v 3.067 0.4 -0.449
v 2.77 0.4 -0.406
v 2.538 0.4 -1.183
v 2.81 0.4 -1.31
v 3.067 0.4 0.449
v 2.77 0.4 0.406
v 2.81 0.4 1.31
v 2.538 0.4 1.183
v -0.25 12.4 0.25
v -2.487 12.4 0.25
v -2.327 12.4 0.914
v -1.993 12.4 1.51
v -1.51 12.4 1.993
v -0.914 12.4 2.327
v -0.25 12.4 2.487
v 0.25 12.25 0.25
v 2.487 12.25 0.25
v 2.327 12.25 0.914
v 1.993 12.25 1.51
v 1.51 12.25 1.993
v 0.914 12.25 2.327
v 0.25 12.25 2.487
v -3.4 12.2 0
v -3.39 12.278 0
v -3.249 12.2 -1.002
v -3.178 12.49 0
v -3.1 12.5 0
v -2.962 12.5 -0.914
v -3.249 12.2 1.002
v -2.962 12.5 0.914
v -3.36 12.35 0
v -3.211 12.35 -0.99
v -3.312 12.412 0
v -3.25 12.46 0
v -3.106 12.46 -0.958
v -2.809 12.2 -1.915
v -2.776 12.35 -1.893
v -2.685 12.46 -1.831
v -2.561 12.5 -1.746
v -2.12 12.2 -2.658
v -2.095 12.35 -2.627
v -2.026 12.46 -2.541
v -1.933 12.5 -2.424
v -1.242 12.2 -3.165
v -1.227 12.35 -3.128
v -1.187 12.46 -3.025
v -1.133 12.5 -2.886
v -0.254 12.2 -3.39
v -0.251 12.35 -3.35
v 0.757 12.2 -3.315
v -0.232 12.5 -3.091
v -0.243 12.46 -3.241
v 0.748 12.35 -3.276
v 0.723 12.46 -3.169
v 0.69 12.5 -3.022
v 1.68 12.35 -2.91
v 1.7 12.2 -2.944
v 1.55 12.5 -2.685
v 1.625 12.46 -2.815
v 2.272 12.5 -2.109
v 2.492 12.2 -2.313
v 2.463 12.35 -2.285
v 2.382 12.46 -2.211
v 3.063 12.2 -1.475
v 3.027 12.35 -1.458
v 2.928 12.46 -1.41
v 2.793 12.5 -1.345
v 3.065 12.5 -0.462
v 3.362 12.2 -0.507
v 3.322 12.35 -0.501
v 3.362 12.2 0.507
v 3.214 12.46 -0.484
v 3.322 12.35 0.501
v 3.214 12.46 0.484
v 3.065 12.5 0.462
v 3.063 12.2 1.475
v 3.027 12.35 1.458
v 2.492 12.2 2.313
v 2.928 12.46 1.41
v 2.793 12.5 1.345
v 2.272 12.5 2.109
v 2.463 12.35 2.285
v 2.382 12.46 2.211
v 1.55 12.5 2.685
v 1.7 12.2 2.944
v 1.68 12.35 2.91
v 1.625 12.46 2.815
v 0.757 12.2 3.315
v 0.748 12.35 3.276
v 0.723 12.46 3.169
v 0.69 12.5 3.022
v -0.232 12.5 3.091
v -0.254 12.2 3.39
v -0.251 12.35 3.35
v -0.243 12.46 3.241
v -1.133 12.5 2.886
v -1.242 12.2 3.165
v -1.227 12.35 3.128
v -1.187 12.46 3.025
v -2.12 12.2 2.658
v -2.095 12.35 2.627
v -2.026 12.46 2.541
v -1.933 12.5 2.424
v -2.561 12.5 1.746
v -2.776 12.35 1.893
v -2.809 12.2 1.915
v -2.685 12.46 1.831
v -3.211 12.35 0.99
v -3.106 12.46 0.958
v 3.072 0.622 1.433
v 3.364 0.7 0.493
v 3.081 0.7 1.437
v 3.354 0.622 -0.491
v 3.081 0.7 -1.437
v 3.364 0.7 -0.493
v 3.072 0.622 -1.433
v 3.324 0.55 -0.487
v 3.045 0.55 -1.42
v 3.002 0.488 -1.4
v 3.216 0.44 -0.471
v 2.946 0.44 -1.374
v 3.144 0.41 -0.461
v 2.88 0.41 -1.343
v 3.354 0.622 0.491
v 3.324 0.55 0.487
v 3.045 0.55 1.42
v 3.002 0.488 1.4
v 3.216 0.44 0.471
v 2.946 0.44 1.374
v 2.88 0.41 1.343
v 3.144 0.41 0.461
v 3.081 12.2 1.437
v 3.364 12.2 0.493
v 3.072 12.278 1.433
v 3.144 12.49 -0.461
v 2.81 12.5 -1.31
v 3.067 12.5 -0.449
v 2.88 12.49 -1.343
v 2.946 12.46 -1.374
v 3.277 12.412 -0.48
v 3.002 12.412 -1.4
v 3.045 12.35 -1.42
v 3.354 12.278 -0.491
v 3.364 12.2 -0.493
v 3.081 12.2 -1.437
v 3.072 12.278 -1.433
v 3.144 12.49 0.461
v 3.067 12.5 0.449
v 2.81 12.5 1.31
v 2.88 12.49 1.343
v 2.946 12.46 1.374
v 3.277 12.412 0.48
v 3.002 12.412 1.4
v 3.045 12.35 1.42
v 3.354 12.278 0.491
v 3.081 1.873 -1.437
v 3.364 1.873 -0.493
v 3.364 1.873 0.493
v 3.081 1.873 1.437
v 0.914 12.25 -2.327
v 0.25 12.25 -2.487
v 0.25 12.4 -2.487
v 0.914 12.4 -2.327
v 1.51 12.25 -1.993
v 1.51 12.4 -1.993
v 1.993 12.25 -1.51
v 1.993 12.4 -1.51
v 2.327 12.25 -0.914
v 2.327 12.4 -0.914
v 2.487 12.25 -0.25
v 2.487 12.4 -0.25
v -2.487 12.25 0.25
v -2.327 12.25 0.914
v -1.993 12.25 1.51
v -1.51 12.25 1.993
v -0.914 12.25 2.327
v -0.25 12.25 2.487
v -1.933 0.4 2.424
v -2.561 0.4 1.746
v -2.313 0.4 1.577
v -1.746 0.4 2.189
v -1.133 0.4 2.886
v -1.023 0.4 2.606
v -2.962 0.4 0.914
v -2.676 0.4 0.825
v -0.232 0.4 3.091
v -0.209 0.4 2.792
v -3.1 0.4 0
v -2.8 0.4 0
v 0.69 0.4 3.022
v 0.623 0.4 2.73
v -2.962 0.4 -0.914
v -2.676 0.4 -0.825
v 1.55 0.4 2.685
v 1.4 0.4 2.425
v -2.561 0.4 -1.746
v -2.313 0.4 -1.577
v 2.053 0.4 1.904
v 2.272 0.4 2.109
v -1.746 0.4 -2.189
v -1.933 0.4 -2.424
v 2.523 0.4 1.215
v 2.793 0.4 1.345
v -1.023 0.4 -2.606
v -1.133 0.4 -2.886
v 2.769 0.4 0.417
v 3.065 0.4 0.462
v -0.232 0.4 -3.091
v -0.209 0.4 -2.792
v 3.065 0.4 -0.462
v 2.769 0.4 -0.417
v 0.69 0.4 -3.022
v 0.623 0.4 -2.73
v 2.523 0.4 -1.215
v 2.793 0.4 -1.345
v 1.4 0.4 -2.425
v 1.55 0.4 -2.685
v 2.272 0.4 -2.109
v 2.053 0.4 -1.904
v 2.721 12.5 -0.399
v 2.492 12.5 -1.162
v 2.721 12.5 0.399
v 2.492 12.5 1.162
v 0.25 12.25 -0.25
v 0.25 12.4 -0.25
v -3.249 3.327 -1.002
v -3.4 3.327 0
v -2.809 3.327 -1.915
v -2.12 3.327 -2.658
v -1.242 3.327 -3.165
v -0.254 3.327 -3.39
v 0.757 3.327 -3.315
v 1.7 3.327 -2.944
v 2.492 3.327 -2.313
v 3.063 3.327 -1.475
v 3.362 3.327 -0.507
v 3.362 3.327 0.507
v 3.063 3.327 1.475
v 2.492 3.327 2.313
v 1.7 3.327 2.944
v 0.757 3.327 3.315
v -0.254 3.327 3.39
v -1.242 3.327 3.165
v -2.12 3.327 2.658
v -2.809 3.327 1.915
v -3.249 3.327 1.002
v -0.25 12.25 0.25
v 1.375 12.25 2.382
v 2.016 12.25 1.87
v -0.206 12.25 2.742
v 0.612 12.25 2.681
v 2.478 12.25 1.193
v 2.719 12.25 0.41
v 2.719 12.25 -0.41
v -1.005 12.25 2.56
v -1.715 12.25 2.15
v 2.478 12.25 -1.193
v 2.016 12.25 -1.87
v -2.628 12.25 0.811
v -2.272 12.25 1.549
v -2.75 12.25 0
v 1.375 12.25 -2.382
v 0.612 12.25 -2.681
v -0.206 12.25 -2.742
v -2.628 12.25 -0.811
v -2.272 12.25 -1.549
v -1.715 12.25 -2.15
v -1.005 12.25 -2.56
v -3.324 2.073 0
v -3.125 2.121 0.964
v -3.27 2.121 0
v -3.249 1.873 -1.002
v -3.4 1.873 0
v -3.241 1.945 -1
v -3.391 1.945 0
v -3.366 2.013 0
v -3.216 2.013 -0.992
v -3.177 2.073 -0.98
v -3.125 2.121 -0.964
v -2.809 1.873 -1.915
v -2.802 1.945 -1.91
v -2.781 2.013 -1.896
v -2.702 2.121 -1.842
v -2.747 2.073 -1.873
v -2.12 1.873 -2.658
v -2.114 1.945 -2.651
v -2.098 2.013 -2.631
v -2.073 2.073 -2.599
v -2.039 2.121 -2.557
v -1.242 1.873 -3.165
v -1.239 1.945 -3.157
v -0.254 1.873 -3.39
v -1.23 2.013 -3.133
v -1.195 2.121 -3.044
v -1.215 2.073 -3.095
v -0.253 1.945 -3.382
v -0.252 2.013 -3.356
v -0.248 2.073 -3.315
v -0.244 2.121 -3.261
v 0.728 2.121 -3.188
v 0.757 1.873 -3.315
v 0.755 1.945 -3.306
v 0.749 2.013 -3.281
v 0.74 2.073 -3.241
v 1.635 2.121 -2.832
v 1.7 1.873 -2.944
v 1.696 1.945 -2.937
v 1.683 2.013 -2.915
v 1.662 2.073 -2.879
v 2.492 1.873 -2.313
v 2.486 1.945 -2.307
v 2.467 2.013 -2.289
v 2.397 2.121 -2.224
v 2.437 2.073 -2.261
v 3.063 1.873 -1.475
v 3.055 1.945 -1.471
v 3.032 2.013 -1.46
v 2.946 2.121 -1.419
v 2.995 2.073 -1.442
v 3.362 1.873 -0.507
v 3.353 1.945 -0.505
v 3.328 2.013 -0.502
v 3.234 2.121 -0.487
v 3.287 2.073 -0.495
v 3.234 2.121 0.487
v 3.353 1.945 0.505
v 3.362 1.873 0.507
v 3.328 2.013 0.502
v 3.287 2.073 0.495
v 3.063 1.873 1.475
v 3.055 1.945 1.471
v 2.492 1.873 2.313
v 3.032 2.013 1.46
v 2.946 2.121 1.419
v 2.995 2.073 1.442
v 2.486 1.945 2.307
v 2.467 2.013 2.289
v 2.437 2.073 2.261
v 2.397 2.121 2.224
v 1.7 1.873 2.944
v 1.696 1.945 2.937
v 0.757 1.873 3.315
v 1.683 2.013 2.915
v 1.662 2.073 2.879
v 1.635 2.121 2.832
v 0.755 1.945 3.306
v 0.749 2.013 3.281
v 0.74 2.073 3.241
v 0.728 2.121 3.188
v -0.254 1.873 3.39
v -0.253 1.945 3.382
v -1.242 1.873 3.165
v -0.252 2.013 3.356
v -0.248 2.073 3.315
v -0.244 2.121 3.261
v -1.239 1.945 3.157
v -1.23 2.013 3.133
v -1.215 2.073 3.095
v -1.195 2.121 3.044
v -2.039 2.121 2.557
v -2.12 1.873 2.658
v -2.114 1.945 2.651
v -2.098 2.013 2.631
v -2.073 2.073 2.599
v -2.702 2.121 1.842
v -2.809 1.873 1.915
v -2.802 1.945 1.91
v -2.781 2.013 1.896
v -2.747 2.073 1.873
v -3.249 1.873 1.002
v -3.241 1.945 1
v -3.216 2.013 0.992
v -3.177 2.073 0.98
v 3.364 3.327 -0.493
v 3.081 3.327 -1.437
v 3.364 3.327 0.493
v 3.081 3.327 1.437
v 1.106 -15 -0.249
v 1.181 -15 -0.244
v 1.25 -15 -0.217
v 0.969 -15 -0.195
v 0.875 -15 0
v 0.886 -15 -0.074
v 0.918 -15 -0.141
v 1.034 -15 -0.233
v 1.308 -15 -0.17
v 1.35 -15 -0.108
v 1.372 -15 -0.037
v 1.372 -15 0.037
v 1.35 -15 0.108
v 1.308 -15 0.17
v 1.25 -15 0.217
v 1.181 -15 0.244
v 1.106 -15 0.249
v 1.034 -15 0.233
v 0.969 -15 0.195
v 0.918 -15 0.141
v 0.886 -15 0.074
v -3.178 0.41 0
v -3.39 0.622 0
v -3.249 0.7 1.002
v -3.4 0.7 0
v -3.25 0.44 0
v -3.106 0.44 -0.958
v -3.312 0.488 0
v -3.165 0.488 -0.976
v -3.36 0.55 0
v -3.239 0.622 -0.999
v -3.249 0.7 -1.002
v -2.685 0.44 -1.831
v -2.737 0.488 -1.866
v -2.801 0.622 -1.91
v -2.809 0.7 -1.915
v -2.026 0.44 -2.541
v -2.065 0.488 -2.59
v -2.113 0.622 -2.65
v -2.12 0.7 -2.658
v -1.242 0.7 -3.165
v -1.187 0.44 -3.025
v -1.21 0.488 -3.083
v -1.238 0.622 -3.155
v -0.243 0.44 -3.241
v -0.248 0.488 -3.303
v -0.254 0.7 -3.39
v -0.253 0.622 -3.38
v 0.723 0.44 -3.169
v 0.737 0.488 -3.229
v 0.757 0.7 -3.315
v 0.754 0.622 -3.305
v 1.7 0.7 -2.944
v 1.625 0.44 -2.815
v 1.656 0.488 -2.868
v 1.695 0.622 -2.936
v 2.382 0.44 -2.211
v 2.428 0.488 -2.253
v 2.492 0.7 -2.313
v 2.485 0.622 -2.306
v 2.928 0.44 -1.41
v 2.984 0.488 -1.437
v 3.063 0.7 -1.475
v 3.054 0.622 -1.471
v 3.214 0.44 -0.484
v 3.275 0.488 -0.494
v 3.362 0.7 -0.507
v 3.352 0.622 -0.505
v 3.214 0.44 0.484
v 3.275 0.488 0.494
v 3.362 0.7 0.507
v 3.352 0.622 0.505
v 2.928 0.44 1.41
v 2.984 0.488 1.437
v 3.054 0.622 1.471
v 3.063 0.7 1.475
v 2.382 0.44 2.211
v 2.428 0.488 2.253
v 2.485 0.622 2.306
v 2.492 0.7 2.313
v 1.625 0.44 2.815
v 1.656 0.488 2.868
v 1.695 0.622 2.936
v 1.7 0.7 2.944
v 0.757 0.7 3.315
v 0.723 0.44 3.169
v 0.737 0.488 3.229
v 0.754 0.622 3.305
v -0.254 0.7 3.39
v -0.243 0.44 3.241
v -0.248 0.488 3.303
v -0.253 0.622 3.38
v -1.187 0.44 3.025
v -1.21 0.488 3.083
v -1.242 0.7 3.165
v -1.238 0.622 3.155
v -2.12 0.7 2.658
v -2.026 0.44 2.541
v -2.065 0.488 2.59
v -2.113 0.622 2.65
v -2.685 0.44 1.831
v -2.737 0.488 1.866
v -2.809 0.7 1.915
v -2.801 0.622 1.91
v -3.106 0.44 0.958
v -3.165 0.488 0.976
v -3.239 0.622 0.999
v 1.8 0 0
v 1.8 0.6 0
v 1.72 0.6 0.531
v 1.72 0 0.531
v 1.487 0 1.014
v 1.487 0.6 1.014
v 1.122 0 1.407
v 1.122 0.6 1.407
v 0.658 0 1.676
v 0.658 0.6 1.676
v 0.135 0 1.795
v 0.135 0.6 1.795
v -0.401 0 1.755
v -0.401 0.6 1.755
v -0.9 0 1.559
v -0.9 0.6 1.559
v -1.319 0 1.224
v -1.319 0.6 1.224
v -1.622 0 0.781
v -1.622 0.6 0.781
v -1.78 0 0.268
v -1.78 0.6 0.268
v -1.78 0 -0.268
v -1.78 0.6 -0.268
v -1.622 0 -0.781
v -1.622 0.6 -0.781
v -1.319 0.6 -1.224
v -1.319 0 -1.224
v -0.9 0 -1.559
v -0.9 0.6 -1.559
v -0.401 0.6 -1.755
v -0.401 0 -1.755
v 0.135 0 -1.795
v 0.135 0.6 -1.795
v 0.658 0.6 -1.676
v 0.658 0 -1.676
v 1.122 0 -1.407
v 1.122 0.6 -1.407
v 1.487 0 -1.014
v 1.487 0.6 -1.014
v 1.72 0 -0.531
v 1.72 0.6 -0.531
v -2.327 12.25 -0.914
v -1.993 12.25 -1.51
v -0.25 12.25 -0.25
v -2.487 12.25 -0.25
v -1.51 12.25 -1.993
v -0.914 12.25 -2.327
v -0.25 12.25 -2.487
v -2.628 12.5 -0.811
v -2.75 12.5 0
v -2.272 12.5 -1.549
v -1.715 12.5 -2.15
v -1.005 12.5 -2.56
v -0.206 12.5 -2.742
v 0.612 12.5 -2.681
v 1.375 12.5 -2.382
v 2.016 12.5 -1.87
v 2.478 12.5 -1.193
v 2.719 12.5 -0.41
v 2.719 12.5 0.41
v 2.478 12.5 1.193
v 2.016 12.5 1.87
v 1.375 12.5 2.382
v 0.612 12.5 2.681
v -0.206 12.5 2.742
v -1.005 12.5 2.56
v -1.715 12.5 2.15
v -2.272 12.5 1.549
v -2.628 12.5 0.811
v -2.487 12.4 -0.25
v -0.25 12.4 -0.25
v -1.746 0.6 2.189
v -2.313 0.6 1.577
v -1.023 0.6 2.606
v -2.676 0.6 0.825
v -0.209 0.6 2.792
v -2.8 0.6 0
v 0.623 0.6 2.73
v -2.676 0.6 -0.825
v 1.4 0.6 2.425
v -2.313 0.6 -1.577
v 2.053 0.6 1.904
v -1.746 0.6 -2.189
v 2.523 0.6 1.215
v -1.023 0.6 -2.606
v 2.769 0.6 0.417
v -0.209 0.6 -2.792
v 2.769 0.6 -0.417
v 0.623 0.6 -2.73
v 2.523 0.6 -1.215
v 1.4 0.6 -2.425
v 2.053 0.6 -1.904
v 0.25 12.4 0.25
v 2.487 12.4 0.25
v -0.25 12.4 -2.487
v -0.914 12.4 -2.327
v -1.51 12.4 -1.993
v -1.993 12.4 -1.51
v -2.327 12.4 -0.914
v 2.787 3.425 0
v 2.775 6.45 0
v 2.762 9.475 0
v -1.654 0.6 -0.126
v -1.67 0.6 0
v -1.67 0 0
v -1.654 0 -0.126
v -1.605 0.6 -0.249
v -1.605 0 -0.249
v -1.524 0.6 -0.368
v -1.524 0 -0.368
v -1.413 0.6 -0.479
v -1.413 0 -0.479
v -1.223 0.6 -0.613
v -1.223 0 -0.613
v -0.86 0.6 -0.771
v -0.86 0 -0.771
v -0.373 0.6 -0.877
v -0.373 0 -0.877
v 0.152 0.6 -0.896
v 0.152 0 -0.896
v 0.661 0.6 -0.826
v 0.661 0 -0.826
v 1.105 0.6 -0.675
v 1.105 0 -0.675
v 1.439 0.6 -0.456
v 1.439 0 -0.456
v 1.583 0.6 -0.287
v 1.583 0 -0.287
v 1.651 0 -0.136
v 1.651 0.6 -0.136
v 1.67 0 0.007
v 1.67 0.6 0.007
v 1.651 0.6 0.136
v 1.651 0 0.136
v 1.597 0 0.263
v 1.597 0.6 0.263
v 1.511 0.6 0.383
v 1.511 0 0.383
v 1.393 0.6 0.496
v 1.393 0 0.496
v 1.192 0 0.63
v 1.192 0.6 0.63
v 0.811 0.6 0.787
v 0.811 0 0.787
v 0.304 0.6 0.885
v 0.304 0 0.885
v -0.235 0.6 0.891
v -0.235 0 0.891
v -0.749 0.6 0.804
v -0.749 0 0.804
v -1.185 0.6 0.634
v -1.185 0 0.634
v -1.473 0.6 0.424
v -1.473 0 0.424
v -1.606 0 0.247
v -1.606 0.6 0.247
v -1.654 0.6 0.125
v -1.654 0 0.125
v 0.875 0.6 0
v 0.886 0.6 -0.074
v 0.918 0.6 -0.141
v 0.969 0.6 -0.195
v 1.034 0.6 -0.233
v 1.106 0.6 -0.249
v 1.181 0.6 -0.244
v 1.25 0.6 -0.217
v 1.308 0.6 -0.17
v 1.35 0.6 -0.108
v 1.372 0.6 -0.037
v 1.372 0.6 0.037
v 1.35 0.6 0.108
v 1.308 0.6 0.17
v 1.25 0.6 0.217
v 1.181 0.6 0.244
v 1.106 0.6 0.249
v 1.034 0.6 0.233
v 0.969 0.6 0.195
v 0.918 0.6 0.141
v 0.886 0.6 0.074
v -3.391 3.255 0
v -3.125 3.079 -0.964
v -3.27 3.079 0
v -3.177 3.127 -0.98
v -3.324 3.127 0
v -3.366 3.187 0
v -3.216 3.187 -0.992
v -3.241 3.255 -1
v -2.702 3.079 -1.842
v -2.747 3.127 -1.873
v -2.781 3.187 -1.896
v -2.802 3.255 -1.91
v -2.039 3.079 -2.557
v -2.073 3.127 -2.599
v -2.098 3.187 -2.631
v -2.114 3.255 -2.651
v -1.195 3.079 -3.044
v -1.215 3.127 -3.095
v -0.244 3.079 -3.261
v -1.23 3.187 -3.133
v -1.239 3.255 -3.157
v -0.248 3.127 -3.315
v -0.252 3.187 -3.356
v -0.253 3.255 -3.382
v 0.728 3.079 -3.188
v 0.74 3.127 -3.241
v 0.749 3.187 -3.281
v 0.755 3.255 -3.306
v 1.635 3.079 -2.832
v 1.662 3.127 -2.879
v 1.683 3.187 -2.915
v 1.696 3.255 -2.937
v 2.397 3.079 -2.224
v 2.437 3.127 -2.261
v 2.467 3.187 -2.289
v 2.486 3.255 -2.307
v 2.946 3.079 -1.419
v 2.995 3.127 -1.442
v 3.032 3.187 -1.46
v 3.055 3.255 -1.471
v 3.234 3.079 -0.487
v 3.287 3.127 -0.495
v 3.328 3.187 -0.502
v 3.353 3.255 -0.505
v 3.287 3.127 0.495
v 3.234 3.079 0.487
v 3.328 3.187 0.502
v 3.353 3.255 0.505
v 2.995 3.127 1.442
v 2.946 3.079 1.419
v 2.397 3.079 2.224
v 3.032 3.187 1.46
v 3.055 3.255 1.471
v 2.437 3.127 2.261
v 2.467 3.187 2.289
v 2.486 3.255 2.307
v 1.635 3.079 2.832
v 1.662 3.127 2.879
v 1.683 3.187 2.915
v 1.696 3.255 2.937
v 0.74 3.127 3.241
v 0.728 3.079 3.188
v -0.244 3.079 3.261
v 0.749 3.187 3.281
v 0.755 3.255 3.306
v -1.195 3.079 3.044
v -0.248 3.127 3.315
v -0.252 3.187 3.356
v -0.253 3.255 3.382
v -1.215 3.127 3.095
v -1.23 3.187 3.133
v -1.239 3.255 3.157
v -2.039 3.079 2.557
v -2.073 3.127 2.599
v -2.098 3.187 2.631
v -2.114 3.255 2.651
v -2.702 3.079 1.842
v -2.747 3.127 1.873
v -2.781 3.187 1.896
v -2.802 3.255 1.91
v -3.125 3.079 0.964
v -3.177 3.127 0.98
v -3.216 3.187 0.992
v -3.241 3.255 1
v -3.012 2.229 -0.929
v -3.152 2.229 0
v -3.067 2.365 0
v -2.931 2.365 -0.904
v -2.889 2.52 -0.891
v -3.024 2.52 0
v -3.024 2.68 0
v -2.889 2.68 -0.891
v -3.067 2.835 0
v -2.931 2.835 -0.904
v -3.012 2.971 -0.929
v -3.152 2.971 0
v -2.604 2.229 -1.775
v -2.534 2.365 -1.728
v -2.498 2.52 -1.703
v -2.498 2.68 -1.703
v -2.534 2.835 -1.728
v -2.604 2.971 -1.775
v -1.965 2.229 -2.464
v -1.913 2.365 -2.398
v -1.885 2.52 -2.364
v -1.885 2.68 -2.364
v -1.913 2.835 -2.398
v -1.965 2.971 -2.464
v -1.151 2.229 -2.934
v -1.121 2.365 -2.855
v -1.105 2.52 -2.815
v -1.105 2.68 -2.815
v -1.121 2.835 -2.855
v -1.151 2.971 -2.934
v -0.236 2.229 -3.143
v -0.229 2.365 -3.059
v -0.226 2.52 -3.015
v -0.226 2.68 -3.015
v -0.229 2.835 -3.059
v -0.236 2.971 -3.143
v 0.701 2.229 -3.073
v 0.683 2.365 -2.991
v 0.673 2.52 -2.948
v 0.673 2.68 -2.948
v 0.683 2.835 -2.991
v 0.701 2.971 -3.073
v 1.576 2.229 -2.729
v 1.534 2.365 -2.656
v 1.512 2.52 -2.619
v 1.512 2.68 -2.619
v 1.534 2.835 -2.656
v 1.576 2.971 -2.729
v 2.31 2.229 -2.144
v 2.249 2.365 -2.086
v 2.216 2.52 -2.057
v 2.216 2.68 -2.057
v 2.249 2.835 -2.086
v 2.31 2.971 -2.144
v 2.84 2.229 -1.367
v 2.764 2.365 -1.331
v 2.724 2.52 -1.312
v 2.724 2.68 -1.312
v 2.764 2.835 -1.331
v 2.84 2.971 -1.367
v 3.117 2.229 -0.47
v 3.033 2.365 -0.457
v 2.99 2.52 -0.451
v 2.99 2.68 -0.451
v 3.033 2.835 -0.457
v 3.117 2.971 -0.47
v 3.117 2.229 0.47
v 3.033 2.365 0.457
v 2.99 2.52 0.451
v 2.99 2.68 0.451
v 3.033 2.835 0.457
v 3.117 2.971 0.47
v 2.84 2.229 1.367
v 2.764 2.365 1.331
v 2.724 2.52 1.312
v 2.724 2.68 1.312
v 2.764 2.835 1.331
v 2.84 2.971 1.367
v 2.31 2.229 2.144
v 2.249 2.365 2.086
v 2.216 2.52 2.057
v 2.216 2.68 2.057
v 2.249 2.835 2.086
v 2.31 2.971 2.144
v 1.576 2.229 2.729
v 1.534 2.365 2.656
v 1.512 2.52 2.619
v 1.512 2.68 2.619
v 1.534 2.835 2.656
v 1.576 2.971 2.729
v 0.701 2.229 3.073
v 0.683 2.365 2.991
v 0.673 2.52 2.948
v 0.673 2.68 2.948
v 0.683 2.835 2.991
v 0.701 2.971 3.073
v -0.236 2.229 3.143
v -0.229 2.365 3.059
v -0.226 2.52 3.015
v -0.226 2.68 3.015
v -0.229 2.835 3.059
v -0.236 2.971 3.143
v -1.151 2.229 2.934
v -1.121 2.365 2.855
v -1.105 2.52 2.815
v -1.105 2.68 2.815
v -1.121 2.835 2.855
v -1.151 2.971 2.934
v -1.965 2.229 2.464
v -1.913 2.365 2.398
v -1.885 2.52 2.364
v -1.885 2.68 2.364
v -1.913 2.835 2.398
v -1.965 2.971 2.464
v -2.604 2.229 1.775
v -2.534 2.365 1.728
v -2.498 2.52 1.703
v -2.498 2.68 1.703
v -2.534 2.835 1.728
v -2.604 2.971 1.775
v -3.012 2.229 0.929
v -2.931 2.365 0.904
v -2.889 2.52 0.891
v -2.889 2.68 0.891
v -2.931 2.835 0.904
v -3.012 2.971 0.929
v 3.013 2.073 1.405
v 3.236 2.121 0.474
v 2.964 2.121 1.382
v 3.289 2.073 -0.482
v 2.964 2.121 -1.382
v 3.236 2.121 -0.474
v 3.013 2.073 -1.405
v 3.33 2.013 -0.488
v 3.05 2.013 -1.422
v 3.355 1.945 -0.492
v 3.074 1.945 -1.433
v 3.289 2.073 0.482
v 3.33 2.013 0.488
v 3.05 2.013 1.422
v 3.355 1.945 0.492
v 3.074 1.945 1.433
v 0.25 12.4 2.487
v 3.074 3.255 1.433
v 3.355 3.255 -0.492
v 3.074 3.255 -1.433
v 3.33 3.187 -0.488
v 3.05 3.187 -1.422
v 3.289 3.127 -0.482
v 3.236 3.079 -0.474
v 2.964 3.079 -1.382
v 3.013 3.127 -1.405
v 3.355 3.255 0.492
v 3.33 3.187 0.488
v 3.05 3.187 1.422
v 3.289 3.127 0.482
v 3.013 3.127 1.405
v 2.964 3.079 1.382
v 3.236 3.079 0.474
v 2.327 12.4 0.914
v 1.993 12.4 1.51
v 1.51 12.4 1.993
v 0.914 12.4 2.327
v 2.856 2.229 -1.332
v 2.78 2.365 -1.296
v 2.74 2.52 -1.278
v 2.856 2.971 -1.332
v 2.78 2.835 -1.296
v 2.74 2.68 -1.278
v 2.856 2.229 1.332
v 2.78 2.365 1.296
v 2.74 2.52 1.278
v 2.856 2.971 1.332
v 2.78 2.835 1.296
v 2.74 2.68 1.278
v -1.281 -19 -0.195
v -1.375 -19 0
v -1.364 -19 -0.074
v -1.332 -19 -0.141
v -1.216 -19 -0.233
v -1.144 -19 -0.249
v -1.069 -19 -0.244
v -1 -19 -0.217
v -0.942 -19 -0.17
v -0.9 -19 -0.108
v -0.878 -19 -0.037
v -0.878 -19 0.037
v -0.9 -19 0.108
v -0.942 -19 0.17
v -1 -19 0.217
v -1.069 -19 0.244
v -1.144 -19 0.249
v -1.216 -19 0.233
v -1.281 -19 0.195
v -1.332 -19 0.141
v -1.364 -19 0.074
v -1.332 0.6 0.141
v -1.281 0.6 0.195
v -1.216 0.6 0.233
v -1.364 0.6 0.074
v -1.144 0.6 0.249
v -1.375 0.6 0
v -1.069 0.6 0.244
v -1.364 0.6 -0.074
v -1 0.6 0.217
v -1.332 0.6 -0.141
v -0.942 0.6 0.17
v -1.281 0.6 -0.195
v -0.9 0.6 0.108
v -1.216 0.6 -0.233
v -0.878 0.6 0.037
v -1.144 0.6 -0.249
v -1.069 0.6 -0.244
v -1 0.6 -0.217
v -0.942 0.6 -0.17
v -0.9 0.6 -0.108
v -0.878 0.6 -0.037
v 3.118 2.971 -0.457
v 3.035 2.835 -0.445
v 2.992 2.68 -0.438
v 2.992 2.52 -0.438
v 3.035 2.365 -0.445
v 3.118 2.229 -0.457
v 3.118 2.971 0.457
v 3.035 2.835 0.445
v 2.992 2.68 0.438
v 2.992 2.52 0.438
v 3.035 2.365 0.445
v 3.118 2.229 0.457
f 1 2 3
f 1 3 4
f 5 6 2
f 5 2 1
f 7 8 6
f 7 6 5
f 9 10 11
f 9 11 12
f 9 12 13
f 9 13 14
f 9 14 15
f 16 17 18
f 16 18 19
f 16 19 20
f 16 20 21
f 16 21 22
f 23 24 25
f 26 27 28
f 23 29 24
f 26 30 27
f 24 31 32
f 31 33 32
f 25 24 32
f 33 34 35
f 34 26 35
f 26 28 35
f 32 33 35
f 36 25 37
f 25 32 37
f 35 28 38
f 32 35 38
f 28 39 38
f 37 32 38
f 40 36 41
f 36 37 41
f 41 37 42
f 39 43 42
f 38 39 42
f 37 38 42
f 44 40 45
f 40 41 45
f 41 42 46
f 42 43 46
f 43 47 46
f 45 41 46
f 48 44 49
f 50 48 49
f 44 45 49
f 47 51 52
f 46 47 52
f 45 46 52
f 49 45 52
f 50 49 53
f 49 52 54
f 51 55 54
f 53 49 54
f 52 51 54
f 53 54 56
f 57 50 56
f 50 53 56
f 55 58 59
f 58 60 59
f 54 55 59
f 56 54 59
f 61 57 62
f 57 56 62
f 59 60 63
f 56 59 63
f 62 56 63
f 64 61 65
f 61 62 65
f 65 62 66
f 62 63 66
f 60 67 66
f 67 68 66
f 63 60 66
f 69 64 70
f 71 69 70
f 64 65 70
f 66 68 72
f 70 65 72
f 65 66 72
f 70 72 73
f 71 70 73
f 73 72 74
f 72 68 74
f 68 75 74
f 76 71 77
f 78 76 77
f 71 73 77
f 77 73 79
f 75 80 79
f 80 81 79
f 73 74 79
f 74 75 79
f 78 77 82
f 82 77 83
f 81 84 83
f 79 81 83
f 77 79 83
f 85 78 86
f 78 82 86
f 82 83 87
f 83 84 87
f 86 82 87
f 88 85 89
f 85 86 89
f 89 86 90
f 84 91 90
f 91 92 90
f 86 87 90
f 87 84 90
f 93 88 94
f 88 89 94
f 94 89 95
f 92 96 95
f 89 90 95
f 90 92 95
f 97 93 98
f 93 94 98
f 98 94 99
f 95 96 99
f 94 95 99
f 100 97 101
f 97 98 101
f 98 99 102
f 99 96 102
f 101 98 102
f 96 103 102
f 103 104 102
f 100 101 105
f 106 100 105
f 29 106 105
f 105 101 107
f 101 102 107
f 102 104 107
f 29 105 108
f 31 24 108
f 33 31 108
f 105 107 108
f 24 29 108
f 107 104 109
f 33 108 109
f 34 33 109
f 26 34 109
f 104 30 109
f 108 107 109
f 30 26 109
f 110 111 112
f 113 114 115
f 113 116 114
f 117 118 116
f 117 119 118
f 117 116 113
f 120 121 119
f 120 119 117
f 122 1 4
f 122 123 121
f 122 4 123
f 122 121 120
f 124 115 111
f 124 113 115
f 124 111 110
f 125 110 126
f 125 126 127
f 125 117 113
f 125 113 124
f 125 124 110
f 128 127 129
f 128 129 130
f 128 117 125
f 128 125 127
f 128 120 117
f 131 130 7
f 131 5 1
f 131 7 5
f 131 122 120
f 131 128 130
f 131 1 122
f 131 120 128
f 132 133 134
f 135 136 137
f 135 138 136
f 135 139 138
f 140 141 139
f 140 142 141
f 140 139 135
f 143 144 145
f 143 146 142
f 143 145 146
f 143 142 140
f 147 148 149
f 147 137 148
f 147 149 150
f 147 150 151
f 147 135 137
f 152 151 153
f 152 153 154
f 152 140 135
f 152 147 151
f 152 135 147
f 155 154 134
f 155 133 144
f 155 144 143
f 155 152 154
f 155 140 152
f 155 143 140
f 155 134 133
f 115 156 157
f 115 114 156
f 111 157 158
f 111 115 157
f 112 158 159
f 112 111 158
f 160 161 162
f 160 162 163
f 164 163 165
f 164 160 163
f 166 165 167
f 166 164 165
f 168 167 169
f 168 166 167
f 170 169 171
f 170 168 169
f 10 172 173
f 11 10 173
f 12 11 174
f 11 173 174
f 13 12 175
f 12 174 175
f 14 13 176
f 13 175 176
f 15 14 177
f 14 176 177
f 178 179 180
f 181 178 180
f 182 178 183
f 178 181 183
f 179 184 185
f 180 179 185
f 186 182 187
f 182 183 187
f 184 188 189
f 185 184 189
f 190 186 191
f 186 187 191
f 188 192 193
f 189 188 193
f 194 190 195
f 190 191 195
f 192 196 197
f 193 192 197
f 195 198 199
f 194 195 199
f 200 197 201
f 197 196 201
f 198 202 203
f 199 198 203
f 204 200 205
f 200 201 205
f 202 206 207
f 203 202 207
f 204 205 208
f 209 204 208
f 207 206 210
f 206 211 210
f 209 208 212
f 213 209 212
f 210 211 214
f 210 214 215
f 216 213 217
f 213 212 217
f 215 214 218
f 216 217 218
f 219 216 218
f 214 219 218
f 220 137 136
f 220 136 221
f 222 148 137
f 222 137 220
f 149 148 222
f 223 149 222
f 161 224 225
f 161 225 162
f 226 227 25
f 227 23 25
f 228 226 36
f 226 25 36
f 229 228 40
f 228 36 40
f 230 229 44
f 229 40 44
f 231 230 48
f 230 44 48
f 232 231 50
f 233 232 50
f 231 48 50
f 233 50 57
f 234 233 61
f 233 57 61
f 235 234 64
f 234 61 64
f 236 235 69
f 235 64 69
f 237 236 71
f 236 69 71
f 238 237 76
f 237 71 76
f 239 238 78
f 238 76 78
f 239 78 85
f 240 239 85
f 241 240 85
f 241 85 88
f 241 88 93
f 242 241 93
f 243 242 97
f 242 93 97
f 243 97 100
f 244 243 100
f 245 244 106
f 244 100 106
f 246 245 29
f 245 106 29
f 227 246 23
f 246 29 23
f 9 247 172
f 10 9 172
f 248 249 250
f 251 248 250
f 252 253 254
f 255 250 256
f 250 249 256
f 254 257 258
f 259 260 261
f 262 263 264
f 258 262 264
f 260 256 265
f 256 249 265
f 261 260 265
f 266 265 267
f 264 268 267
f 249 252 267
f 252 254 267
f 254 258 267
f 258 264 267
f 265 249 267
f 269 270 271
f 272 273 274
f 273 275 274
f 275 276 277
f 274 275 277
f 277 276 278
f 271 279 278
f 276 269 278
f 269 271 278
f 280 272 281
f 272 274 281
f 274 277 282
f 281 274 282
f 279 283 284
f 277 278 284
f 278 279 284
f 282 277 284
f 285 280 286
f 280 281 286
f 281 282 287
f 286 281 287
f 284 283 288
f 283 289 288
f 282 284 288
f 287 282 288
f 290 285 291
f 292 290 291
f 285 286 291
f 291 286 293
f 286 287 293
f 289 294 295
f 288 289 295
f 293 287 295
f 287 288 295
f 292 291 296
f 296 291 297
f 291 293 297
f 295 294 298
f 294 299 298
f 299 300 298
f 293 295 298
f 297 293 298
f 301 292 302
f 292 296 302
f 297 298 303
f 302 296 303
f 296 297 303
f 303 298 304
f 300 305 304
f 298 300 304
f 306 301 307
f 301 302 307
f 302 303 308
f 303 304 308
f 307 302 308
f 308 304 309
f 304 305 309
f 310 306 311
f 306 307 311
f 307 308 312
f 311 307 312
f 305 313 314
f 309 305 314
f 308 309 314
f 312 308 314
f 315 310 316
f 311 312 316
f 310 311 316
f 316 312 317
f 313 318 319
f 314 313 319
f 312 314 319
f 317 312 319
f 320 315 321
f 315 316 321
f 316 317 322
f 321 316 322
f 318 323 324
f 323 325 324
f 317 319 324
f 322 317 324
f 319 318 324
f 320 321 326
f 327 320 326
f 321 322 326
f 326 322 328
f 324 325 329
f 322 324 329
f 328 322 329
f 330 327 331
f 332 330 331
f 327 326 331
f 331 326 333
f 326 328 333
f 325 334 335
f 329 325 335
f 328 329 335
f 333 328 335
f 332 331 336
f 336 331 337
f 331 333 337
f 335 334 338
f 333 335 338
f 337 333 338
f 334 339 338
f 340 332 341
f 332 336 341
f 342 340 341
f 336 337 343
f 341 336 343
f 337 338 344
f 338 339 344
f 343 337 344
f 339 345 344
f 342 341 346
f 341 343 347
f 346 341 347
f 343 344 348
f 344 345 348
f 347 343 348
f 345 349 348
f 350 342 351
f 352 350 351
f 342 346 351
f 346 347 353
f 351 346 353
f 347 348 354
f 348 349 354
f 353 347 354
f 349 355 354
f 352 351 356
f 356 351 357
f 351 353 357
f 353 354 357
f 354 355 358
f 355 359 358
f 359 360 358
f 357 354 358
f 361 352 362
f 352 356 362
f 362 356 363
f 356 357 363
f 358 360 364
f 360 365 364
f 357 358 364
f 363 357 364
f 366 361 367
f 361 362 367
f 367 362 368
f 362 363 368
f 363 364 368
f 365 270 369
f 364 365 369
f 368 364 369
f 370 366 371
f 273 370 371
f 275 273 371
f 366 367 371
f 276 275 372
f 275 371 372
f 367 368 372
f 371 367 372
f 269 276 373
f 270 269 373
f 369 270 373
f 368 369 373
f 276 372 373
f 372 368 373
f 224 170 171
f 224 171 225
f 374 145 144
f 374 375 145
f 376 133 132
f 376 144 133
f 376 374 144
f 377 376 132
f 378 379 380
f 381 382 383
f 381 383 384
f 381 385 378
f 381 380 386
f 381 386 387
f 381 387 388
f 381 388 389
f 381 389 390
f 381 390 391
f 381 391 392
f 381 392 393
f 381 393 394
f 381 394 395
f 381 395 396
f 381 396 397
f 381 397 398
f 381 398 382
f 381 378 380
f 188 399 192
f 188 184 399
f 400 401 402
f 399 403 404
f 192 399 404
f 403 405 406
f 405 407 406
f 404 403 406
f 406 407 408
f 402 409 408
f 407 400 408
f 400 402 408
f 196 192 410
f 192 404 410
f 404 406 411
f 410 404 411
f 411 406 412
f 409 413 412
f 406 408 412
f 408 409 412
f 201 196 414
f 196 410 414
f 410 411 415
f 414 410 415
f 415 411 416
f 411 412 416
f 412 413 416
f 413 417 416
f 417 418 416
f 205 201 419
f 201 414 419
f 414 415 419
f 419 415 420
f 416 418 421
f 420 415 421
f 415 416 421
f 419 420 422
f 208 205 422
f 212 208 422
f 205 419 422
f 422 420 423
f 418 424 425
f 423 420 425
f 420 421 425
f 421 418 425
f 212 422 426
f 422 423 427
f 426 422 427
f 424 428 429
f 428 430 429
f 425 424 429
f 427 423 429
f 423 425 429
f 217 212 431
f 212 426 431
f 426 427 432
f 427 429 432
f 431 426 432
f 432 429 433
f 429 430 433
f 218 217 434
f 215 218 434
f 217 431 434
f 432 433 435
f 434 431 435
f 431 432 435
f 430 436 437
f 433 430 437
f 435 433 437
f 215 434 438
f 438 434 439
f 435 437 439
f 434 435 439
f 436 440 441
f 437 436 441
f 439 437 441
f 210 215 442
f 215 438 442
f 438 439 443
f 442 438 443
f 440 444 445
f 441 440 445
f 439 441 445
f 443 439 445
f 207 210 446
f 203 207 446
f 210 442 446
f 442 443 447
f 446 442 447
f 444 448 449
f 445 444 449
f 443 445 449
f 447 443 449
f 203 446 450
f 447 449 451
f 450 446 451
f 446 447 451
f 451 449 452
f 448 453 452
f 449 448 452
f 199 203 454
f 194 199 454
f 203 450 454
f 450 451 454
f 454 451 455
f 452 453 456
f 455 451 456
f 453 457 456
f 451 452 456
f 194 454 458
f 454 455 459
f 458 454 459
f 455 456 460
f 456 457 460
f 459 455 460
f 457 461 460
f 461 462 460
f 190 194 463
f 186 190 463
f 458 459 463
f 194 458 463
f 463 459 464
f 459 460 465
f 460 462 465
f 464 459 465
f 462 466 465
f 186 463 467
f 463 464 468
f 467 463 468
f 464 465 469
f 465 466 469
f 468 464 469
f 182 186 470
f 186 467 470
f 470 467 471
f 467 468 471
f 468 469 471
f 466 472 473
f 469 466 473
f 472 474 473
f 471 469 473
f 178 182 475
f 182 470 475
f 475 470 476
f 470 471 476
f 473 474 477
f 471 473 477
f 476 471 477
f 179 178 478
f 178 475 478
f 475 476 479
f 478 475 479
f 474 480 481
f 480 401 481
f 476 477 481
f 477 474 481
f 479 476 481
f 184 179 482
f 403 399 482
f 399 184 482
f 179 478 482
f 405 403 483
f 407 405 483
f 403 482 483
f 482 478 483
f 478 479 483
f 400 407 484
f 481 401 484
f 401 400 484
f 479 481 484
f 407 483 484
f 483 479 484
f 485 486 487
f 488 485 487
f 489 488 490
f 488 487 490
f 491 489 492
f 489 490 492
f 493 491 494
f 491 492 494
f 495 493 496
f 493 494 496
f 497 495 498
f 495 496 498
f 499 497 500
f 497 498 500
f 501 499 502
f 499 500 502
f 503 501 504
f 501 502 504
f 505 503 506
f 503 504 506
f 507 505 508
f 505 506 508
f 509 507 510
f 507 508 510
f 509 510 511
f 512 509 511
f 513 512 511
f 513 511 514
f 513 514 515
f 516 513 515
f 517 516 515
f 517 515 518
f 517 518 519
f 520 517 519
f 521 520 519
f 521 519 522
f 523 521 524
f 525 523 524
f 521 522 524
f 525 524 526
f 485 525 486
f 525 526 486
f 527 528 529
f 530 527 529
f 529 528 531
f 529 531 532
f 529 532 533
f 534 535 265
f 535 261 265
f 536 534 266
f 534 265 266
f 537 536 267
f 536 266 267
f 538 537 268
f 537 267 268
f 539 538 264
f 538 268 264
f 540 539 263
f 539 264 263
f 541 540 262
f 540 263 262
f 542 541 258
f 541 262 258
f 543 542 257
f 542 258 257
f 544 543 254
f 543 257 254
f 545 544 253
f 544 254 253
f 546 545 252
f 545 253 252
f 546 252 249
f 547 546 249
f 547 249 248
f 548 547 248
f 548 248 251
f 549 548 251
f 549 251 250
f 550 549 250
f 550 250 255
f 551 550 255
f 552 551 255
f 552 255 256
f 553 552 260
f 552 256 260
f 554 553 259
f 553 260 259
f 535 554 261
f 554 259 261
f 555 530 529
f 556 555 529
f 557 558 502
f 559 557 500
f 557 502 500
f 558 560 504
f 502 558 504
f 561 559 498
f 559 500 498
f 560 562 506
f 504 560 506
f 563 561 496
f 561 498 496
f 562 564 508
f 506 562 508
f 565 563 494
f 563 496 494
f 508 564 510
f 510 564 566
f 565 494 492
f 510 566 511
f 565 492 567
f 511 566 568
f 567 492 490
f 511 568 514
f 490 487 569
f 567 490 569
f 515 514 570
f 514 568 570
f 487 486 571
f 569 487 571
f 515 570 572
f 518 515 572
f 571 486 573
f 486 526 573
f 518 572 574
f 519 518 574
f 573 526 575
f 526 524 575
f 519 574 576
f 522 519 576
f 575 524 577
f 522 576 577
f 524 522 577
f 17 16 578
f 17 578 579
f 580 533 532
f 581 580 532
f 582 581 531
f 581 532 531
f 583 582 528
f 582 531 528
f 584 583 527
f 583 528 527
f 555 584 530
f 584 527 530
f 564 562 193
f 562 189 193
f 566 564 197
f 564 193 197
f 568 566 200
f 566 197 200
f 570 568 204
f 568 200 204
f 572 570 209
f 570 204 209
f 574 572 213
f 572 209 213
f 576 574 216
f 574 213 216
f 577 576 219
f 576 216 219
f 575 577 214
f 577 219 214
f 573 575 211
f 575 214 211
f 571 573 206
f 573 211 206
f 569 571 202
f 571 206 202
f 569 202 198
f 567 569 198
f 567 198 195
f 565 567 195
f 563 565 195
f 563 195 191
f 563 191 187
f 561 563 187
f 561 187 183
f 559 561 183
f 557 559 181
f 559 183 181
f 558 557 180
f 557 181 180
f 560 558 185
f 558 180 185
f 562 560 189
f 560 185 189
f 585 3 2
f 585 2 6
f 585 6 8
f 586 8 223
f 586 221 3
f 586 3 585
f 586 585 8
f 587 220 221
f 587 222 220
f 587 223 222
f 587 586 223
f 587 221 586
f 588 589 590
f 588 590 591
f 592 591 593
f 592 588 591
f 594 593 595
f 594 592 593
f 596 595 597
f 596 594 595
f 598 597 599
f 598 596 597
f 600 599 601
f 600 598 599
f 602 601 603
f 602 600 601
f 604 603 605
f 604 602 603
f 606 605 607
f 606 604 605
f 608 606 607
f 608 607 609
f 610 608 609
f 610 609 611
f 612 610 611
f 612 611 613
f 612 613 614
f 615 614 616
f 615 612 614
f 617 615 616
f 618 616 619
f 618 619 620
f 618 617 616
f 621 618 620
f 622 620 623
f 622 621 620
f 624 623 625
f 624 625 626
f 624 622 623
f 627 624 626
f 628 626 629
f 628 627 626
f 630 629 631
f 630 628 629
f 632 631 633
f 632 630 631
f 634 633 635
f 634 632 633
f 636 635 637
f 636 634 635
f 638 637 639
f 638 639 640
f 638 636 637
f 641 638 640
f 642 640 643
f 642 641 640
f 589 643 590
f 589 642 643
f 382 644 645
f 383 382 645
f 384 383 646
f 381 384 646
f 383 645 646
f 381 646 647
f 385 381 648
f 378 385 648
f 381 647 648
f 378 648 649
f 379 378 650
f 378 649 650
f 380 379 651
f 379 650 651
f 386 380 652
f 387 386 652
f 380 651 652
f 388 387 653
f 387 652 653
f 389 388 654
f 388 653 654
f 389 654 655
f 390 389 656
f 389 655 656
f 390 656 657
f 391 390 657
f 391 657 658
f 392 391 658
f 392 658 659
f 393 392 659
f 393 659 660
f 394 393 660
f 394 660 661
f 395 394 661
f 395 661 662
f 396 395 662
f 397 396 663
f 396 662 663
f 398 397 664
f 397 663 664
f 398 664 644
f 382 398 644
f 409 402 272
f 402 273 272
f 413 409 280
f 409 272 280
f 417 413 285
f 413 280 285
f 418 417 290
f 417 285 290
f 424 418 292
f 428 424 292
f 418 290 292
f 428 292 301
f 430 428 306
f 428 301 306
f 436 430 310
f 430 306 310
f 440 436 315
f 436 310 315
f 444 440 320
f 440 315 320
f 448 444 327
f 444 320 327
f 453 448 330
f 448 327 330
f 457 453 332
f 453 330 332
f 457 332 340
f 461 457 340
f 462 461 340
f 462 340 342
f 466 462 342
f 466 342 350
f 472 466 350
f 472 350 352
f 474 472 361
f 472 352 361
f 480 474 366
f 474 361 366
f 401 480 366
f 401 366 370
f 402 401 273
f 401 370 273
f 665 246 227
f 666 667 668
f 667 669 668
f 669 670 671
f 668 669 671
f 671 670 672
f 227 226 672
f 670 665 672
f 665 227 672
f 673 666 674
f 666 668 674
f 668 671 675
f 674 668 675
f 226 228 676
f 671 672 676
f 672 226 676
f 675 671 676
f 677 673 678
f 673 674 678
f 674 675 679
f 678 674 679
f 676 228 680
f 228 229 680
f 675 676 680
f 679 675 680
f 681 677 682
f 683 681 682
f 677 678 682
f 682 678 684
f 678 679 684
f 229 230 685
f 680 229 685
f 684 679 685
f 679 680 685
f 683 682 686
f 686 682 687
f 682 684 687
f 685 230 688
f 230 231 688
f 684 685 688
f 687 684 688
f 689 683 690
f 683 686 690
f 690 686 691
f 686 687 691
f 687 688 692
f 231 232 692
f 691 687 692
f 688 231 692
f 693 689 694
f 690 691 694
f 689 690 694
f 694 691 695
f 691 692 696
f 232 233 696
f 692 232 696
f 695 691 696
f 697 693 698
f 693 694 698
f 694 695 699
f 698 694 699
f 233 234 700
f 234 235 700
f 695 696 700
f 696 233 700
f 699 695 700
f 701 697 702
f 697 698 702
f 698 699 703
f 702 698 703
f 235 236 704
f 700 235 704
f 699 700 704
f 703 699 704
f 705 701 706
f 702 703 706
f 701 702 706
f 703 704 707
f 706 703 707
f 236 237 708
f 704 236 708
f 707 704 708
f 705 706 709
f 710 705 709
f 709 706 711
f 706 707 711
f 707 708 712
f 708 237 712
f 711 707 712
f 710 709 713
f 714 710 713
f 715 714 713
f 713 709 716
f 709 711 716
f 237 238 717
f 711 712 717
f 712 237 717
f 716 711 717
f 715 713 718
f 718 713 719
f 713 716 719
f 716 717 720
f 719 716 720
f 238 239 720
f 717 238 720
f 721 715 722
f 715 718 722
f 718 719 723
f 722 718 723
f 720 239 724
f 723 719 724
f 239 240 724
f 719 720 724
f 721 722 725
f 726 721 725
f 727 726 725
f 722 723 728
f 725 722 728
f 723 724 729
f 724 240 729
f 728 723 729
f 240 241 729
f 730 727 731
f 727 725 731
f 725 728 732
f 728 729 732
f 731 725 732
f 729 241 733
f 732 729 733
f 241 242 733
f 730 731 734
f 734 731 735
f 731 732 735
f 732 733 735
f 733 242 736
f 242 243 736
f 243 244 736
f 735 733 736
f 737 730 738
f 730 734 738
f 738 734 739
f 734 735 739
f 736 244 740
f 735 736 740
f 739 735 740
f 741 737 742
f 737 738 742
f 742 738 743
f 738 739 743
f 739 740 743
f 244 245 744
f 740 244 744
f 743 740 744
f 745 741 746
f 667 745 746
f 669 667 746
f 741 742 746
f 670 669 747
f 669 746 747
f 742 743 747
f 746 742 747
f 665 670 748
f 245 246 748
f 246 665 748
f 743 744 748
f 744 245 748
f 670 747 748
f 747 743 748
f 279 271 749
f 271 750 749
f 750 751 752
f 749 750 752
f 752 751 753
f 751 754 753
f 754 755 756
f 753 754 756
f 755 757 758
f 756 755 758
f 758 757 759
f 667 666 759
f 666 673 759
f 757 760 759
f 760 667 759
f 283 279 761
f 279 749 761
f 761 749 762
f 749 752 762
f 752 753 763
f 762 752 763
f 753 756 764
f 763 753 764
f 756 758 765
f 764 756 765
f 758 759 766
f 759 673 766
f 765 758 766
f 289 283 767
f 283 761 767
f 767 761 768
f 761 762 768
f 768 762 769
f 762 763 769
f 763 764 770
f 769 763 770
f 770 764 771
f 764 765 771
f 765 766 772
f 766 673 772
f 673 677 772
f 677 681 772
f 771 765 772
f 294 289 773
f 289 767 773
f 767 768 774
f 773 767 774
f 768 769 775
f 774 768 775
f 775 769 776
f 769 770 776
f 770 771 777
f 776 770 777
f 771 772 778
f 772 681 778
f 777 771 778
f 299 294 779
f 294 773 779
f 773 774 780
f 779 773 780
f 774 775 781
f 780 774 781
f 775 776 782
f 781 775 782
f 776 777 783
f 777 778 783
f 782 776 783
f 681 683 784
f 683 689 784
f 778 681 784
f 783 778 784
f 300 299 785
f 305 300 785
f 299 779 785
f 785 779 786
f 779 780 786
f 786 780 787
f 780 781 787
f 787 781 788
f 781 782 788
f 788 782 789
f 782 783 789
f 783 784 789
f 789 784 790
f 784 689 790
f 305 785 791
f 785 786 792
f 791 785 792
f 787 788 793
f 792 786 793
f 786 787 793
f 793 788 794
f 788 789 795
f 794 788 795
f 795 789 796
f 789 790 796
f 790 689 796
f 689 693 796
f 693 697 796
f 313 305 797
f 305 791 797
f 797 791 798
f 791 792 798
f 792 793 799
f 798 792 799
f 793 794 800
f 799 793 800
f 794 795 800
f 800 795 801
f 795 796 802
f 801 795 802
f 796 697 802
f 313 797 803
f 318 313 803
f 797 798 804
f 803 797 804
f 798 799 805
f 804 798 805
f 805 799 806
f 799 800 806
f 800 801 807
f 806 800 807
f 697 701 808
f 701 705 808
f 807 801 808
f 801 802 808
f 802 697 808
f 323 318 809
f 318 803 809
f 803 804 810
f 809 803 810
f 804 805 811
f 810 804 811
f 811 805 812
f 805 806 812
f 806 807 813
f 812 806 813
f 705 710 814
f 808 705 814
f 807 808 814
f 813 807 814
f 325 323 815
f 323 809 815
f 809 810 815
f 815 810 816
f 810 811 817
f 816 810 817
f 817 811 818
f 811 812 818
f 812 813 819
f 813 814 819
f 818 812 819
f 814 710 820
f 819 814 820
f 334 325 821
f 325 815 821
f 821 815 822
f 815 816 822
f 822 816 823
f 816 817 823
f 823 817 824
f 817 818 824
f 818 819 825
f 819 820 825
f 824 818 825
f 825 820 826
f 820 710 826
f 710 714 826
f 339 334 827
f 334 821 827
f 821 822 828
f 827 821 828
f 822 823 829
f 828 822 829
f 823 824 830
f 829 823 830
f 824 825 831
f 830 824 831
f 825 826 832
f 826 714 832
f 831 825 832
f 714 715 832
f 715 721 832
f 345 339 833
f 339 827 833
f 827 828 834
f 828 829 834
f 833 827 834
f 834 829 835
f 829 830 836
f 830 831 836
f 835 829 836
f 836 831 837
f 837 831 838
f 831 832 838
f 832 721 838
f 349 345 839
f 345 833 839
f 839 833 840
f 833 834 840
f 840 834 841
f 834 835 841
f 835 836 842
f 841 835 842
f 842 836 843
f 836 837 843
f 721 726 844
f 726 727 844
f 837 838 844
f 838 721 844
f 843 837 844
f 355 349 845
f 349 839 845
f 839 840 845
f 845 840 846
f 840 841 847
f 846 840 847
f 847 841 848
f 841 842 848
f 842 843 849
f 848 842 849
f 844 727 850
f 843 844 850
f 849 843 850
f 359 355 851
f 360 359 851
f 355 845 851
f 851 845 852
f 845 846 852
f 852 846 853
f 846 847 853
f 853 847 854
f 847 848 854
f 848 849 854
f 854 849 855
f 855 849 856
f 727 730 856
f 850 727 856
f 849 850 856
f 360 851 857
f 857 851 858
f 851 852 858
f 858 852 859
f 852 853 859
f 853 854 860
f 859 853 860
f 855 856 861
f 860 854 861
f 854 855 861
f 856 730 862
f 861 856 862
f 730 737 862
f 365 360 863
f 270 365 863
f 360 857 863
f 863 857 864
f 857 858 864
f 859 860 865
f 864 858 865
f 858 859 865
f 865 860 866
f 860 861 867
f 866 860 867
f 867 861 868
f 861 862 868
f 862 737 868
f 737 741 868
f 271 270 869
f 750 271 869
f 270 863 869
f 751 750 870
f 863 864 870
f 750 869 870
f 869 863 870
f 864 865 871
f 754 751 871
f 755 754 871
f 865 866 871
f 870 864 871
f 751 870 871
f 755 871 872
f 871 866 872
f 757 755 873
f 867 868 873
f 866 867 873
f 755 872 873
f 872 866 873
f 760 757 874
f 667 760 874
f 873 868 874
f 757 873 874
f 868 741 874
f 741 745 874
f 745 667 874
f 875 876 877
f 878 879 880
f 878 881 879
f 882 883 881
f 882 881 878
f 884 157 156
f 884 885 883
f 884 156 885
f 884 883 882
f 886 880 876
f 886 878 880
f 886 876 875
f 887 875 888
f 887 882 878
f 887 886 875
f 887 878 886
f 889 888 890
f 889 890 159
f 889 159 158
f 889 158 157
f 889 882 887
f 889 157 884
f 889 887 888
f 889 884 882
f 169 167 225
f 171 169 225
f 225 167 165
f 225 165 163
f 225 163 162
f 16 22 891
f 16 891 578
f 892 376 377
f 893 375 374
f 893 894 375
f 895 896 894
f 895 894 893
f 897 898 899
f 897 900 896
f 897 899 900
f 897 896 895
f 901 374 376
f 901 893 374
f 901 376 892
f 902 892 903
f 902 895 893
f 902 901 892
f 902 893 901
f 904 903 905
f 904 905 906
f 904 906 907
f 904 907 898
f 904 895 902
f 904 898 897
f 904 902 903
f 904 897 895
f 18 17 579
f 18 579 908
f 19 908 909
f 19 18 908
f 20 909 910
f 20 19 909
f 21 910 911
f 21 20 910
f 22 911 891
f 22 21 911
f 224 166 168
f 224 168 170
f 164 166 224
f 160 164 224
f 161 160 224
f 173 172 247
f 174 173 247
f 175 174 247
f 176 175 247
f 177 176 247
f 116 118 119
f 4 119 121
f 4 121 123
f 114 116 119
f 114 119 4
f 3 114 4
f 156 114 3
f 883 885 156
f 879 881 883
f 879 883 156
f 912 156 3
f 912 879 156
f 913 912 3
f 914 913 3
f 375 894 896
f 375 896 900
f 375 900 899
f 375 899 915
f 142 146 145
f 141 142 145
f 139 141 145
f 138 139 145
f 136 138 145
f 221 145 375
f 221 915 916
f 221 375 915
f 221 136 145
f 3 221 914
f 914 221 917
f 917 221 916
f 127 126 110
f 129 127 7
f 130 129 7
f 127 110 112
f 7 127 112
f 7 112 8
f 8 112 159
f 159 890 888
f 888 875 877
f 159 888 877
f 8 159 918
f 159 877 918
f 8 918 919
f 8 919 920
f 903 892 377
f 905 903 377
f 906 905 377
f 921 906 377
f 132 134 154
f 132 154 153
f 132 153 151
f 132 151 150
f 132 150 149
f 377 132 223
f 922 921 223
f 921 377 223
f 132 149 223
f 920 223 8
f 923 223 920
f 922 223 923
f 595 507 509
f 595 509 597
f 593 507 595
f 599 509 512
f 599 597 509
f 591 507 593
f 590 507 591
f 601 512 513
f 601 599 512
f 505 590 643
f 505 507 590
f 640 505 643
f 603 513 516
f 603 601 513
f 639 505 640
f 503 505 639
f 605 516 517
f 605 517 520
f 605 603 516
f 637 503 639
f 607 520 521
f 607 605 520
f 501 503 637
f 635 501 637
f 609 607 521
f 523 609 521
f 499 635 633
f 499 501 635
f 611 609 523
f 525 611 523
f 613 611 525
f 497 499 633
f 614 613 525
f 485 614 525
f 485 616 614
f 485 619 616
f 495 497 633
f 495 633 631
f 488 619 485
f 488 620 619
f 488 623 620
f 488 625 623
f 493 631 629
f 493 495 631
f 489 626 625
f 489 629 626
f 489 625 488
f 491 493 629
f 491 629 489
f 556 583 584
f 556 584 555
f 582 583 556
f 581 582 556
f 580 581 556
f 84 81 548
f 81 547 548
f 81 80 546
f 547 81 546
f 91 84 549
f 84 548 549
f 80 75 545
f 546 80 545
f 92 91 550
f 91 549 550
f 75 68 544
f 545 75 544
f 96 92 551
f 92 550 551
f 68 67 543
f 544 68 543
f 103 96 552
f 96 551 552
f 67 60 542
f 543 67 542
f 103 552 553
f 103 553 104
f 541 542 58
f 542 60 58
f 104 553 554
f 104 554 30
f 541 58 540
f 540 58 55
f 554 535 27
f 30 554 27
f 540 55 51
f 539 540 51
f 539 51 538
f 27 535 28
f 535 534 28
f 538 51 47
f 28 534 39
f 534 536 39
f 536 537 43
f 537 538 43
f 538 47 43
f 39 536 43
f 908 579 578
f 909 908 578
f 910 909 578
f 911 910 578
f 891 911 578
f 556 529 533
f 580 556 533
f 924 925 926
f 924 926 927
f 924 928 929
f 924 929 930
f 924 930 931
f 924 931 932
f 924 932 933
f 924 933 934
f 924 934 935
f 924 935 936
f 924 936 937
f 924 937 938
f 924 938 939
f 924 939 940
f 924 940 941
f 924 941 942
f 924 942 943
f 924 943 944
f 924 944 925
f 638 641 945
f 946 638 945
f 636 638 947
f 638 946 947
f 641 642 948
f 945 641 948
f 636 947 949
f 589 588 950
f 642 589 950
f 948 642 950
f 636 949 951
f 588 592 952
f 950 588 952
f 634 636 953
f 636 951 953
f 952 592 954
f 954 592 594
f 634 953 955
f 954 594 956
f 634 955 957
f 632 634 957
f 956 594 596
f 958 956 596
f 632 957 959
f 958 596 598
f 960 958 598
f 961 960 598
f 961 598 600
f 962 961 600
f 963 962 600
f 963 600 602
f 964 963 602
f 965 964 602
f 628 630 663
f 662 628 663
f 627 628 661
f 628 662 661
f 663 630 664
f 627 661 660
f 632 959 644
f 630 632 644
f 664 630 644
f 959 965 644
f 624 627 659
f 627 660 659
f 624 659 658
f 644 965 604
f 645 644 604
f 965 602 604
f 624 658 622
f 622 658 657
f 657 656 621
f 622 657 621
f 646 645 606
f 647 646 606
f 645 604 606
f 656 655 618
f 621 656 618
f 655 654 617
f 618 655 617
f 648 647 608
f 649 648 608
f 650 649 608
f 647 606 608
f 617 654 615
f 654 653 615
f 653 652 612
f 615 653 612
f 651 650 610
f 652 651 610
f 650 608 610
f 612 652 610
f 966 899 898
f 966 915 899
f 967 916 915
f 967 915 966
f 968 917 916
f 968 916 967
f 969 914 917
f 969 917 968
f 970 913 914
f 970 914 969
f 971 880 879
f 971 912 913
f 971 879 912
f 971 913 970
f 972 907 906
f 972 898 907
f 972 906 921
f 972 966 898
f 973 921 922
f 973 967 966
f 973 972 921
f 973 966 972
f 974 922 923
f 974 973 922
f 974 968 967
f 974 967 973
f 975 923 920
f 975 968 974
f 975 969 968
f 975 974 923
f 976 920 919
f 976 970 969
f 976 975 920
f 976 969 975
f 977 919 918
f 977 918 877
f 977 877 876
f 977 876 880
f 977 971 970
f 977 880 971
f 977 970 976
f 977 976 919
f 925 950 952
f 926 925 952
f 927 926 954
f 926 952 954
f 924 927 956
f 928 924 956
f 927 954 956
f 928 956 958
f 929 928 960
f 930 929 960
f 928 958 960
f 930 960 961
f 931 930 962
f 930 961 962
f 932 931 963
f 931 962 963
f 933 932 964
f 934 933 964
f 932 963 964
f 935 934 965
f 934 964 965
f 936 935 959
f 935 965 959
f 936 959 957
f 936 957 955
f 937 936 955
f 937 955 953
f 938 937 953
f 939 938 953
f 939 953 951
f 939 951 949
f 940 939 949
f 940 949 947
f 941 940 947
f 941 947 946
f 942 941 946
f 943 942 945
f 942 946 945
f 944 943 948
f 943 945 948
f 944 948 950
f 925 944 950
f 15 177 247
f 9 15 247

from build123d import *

# Parameters (mm, degrees)
BOSS_EXTRUDE1_DEPTH      = 0.15
BOSS_EXTRUDE1_2_DEPTH    = 0.15
BOSS_EXTRUDE1_3_DEPTH    = 0.15
BOSS_EXTRUDE1_4_DEPTH    = 0.15
SKETCH3_R                = 1.8
SKETCH3_RX               = 1.67
SKETCH3_RY               = 0.9
BOSS_EXTRUDE2_DEPTH      = 0.6
REVOLVE3_ANGLE           = 25
REVOLVE3_OTHER_WAY_ANGLE = 25
SKETCH7_R                = 0.25
BOSS_EXTRUDE3_DEPTH      = 19.6
SKETCH7_4_R              = 0.25
BOSS_EXTRUDE4_DEPTH      = 15.6


with BuildPart() as part:
    # Sketch1 → Revolve1 (revolve)
    with BuildSketch(Plane.XY, mode=Mode.PRIVATE) as revolve1_sk:
        with BuildLine():
            Line((0, 0.6), (2.8, 0.6))
            Line((2.8, 0.6), (2.8, 0.4))
            Line((2.8, 0.4), (3.1, 0.4))
            ThreePointArc((3.1, 0.4), (3.312132034, 0.487867966), (3.4, 0.7))
            Line((3.4, 0.7), (3.4, 1.873479579))
            ThreePointArc((3.4, 1.873479579), (3.365540419, 2.013080031), (3.270078093, 2.120609995))
            ThreePointArc((3.270078093, 2.120609995), (3.0180522, 2.6), (3.270078093, 3.079390005))
            ThreePointArc((3.270078093, 3.079390005), (3.365540419, 3.186919969), (3.4, 3.326520421))
            Line((3.4, 3.326520421), (3.4, 12.2))
            ThreePointArc((3.4, 12.2), (3.312132034, 12.412132034), (3.1, 12.5))
            Line((3.1, 12.5), (2.75, 12.5))
            Line((2.75, 12.5), (2.75, 12.25))
            Line((2.75, 12.25), (0, 12.25))
            Line((0, 12.25), (0, 0.6))
        make_face()
    revolve(revolve1_sk.sketch.rotate(Axis((0, 12.25, 0), (0, -1, 0)), 180), axis=Axis((0, 12.25, 0), (0, -1, 0)))



with BuildPart() as body_2:
    # Sketch2 → Boss-Extrude1 (new body)
    with BuildSketch(Plane(origin=(0, 12.25, 0), x_dir=(1, 0, 0), z_dir=(0, 1, 0))):
        with BuildLine():
            Line((-0.25, 0.25), (-0.25, 2.487468593))
            ThreePointArc((-0.25, 2.487468593), (-1.767766953, 1.767766953), (-2.487468593, 0.25))
            Line((-2.487468593, 0.25), (-0.25, 0.25))
        make_face()
    extrude(amount=BOSS_EXTRUDE1_DEPTH)


with BuildPart() as body_3:
    # Sketch2 → Boss-Extrude1 2 (new body)
    with BuildSketch(Plane(origin=(0, 12.25, 0), x_dir=(1, 0, 0), z_dir=(0, 1, 0))):
        with BuildLine():
            Line((0.25, -2.487468593), (0.25, -0.25))
            Line((0.25, -0.25), (2.487468593, -0.25))
            ThreePointArc((2.487468593, -0.25), (1.767766953, -1.767766953), (0.25, -2.487468593))
        make_face()
    extrude(amount=BOSS_EXTRUDE1_2_DEPTH)


with BuildPart() as body_4:
    # Sketch2 → Boss-Extrude1 3 (new body)
    with BuildSketch(Plane(origin=(0, 12.25, 0), x_dir=(1, 0, 0), z_dir=(0, 1, 0))):
        with BuildLine():
            Line((-0.25, -2.487468593), (-0.25, -0.25))
            Line((-0.25, -0.25), (-2.487468593, -0.25))
            ThreePointArc((-2.487468593, -0.25), (-1.767766953, -1.767766953), (-0.25, -2.487468593))
        make_face()
    extrude(amount=BOSS_EXTRUDE1_3_DEPTH)


with BuildPart() as body_5:
    # Sketch2 → Boss-Extrude1 4 (new body)
    with BuildSketch(Plane(origin=(0, 12.25, 0), x_dir=(1, 0, 0), z_dir=(0, 1, 0))):
        with BuildLine():
            Line((0.25, 0.25), (0.25, 2.487468593))
            ThreePointArc((0.25, 2.487468593), (1.767766953, 1.767766953), (2.487468593, 0.25))
            Line((2.487468593, 0.25), (0.25, 0.25))
        make_face()
    extrude(amount=BOSS_EXTRUDE1_4_DEPTH)


with BuildPart() as body_6:
    # Sketch3 → Boss-Extrude2 (new body)
    with BuildSketch(Plane.XZ.offset(-0.6)):
        Circle(SKETCH3_R)
        with Locations(Location((0, 0), (0, 0, 180))):
            Ellipse(SKETCH3_RX, SKETCH3_RY, mode=Mode.SUBTRACT)
    extrude(amount=BOSS_EXTRUDE2_DEPTH)


with BuildPart() as body_7:
    # Sketch5 → Revolve3 (revolve)
    with BuildSketch(Plane.XY):
        with BuildLine():
            Line((2.75, 12.5), (3.1, 12.5))
            ThreePointArc((3.1, 12.5), (3.312132034, 12.412132034), (3.4, 12.2))
            Line((3.4, 12.2), (3.4, 3.326520421))
            ThreePointArc((3.4, 3.326520421), (3.365540419, 3.186919969), (3.270078093, 3.079390005))
            ThreePointArc((3.270078093, 3.079390005), (3.0180522, 2.6), (3.270078093, 2.120609995))
            ThreePointArc((3.270078093, 2.120609995), (3.365540419, 2.013080031), (3.4, 1.873479579))
            Line((3.4, 1.873479579), (3.4, 0.7))
            ThreePointArc((3.4, 0.7), (3.312132034, 0.487867966), (3.1, 0.4))
            Line((3.1, 0.4), (2.8, 0.4))
            Line((2.8, 0.4), (2.75, 12.5))
        make_face()
    revolve(axis=Axis((0, 0, 0), (0, 1, 0)), revolution_arc=REVOLVE3_ANGLE)

    # Sketch5 → Revolve3 other way (revolve)
    with BuildSketch(Plane.XY):
        with BuildLine():
            Line((2.75, 12.5), (3.1, 12.5))
            ThreePointArc((3.1, 12.5), (3.312132034, 12.412132034), (3.4, 12.2))
            Line((3.4, 12.2), (3.4, 3.326520421))
            ThreePointArc((3.4, 3.326520421), (3.365540419, 3.186919969), (3.270078093, 3.079390005))
            ThreePointArc((3.270078093, 3.079390005), (3.0180522, 2.6), (3.270078093, 2.120609995))
            ThreePointArc((3.270078093, 2.120609995), (3.365540419, 2.013080031), (3.4, 1.873479579))
            Line((3.4, 1.873479579), (3.4, 0.7))
            ThreePointArc((3.4, 0.7), (3.312132034, 0.487867966), (3.1, 0.4))
            Line((3.1, 0.4), (2.8, 0.4))
            Line((2.8, 0.4), (2.75, 12.5))
        make_face()
    revolve(axis=Axis((0, 0, 0), (0, -1, 0)), revolution_arc=REVOLVE3_OTHER_WAY_ANGLE)


with BuildPart() as part_1:
    add(part.part)

    add(body_6.part)  # Boss-Extrude3 merges body 6
    # Sketch7 → Boss-Extrude3 (add)
    with BuildSketch(Plane.XZ.offset(-0.6)):
        with Locations(Location((-1.125, 0, 0), (0, 0, 180))):
            Circle(SKETCH7_R)
    extrude(amount=BOSS_EXTRUDE3_DEPTH)

    # Sketch7<4> → Boss-Extrude4 (add)
    with BuildSketch(Plane.XZ.offset(-0.6)):
        with Locations(Location((1.125, 0, 0), (0, 0, 180))):
            Circle(SKETCH7_4_R)
    extrude(amount=BOSS_EXTRUDE4_DEPTH)


solid = Compound([body_2.part, body_3.part, body_4.part, body_5.part, body_7.part, part_1.part])
